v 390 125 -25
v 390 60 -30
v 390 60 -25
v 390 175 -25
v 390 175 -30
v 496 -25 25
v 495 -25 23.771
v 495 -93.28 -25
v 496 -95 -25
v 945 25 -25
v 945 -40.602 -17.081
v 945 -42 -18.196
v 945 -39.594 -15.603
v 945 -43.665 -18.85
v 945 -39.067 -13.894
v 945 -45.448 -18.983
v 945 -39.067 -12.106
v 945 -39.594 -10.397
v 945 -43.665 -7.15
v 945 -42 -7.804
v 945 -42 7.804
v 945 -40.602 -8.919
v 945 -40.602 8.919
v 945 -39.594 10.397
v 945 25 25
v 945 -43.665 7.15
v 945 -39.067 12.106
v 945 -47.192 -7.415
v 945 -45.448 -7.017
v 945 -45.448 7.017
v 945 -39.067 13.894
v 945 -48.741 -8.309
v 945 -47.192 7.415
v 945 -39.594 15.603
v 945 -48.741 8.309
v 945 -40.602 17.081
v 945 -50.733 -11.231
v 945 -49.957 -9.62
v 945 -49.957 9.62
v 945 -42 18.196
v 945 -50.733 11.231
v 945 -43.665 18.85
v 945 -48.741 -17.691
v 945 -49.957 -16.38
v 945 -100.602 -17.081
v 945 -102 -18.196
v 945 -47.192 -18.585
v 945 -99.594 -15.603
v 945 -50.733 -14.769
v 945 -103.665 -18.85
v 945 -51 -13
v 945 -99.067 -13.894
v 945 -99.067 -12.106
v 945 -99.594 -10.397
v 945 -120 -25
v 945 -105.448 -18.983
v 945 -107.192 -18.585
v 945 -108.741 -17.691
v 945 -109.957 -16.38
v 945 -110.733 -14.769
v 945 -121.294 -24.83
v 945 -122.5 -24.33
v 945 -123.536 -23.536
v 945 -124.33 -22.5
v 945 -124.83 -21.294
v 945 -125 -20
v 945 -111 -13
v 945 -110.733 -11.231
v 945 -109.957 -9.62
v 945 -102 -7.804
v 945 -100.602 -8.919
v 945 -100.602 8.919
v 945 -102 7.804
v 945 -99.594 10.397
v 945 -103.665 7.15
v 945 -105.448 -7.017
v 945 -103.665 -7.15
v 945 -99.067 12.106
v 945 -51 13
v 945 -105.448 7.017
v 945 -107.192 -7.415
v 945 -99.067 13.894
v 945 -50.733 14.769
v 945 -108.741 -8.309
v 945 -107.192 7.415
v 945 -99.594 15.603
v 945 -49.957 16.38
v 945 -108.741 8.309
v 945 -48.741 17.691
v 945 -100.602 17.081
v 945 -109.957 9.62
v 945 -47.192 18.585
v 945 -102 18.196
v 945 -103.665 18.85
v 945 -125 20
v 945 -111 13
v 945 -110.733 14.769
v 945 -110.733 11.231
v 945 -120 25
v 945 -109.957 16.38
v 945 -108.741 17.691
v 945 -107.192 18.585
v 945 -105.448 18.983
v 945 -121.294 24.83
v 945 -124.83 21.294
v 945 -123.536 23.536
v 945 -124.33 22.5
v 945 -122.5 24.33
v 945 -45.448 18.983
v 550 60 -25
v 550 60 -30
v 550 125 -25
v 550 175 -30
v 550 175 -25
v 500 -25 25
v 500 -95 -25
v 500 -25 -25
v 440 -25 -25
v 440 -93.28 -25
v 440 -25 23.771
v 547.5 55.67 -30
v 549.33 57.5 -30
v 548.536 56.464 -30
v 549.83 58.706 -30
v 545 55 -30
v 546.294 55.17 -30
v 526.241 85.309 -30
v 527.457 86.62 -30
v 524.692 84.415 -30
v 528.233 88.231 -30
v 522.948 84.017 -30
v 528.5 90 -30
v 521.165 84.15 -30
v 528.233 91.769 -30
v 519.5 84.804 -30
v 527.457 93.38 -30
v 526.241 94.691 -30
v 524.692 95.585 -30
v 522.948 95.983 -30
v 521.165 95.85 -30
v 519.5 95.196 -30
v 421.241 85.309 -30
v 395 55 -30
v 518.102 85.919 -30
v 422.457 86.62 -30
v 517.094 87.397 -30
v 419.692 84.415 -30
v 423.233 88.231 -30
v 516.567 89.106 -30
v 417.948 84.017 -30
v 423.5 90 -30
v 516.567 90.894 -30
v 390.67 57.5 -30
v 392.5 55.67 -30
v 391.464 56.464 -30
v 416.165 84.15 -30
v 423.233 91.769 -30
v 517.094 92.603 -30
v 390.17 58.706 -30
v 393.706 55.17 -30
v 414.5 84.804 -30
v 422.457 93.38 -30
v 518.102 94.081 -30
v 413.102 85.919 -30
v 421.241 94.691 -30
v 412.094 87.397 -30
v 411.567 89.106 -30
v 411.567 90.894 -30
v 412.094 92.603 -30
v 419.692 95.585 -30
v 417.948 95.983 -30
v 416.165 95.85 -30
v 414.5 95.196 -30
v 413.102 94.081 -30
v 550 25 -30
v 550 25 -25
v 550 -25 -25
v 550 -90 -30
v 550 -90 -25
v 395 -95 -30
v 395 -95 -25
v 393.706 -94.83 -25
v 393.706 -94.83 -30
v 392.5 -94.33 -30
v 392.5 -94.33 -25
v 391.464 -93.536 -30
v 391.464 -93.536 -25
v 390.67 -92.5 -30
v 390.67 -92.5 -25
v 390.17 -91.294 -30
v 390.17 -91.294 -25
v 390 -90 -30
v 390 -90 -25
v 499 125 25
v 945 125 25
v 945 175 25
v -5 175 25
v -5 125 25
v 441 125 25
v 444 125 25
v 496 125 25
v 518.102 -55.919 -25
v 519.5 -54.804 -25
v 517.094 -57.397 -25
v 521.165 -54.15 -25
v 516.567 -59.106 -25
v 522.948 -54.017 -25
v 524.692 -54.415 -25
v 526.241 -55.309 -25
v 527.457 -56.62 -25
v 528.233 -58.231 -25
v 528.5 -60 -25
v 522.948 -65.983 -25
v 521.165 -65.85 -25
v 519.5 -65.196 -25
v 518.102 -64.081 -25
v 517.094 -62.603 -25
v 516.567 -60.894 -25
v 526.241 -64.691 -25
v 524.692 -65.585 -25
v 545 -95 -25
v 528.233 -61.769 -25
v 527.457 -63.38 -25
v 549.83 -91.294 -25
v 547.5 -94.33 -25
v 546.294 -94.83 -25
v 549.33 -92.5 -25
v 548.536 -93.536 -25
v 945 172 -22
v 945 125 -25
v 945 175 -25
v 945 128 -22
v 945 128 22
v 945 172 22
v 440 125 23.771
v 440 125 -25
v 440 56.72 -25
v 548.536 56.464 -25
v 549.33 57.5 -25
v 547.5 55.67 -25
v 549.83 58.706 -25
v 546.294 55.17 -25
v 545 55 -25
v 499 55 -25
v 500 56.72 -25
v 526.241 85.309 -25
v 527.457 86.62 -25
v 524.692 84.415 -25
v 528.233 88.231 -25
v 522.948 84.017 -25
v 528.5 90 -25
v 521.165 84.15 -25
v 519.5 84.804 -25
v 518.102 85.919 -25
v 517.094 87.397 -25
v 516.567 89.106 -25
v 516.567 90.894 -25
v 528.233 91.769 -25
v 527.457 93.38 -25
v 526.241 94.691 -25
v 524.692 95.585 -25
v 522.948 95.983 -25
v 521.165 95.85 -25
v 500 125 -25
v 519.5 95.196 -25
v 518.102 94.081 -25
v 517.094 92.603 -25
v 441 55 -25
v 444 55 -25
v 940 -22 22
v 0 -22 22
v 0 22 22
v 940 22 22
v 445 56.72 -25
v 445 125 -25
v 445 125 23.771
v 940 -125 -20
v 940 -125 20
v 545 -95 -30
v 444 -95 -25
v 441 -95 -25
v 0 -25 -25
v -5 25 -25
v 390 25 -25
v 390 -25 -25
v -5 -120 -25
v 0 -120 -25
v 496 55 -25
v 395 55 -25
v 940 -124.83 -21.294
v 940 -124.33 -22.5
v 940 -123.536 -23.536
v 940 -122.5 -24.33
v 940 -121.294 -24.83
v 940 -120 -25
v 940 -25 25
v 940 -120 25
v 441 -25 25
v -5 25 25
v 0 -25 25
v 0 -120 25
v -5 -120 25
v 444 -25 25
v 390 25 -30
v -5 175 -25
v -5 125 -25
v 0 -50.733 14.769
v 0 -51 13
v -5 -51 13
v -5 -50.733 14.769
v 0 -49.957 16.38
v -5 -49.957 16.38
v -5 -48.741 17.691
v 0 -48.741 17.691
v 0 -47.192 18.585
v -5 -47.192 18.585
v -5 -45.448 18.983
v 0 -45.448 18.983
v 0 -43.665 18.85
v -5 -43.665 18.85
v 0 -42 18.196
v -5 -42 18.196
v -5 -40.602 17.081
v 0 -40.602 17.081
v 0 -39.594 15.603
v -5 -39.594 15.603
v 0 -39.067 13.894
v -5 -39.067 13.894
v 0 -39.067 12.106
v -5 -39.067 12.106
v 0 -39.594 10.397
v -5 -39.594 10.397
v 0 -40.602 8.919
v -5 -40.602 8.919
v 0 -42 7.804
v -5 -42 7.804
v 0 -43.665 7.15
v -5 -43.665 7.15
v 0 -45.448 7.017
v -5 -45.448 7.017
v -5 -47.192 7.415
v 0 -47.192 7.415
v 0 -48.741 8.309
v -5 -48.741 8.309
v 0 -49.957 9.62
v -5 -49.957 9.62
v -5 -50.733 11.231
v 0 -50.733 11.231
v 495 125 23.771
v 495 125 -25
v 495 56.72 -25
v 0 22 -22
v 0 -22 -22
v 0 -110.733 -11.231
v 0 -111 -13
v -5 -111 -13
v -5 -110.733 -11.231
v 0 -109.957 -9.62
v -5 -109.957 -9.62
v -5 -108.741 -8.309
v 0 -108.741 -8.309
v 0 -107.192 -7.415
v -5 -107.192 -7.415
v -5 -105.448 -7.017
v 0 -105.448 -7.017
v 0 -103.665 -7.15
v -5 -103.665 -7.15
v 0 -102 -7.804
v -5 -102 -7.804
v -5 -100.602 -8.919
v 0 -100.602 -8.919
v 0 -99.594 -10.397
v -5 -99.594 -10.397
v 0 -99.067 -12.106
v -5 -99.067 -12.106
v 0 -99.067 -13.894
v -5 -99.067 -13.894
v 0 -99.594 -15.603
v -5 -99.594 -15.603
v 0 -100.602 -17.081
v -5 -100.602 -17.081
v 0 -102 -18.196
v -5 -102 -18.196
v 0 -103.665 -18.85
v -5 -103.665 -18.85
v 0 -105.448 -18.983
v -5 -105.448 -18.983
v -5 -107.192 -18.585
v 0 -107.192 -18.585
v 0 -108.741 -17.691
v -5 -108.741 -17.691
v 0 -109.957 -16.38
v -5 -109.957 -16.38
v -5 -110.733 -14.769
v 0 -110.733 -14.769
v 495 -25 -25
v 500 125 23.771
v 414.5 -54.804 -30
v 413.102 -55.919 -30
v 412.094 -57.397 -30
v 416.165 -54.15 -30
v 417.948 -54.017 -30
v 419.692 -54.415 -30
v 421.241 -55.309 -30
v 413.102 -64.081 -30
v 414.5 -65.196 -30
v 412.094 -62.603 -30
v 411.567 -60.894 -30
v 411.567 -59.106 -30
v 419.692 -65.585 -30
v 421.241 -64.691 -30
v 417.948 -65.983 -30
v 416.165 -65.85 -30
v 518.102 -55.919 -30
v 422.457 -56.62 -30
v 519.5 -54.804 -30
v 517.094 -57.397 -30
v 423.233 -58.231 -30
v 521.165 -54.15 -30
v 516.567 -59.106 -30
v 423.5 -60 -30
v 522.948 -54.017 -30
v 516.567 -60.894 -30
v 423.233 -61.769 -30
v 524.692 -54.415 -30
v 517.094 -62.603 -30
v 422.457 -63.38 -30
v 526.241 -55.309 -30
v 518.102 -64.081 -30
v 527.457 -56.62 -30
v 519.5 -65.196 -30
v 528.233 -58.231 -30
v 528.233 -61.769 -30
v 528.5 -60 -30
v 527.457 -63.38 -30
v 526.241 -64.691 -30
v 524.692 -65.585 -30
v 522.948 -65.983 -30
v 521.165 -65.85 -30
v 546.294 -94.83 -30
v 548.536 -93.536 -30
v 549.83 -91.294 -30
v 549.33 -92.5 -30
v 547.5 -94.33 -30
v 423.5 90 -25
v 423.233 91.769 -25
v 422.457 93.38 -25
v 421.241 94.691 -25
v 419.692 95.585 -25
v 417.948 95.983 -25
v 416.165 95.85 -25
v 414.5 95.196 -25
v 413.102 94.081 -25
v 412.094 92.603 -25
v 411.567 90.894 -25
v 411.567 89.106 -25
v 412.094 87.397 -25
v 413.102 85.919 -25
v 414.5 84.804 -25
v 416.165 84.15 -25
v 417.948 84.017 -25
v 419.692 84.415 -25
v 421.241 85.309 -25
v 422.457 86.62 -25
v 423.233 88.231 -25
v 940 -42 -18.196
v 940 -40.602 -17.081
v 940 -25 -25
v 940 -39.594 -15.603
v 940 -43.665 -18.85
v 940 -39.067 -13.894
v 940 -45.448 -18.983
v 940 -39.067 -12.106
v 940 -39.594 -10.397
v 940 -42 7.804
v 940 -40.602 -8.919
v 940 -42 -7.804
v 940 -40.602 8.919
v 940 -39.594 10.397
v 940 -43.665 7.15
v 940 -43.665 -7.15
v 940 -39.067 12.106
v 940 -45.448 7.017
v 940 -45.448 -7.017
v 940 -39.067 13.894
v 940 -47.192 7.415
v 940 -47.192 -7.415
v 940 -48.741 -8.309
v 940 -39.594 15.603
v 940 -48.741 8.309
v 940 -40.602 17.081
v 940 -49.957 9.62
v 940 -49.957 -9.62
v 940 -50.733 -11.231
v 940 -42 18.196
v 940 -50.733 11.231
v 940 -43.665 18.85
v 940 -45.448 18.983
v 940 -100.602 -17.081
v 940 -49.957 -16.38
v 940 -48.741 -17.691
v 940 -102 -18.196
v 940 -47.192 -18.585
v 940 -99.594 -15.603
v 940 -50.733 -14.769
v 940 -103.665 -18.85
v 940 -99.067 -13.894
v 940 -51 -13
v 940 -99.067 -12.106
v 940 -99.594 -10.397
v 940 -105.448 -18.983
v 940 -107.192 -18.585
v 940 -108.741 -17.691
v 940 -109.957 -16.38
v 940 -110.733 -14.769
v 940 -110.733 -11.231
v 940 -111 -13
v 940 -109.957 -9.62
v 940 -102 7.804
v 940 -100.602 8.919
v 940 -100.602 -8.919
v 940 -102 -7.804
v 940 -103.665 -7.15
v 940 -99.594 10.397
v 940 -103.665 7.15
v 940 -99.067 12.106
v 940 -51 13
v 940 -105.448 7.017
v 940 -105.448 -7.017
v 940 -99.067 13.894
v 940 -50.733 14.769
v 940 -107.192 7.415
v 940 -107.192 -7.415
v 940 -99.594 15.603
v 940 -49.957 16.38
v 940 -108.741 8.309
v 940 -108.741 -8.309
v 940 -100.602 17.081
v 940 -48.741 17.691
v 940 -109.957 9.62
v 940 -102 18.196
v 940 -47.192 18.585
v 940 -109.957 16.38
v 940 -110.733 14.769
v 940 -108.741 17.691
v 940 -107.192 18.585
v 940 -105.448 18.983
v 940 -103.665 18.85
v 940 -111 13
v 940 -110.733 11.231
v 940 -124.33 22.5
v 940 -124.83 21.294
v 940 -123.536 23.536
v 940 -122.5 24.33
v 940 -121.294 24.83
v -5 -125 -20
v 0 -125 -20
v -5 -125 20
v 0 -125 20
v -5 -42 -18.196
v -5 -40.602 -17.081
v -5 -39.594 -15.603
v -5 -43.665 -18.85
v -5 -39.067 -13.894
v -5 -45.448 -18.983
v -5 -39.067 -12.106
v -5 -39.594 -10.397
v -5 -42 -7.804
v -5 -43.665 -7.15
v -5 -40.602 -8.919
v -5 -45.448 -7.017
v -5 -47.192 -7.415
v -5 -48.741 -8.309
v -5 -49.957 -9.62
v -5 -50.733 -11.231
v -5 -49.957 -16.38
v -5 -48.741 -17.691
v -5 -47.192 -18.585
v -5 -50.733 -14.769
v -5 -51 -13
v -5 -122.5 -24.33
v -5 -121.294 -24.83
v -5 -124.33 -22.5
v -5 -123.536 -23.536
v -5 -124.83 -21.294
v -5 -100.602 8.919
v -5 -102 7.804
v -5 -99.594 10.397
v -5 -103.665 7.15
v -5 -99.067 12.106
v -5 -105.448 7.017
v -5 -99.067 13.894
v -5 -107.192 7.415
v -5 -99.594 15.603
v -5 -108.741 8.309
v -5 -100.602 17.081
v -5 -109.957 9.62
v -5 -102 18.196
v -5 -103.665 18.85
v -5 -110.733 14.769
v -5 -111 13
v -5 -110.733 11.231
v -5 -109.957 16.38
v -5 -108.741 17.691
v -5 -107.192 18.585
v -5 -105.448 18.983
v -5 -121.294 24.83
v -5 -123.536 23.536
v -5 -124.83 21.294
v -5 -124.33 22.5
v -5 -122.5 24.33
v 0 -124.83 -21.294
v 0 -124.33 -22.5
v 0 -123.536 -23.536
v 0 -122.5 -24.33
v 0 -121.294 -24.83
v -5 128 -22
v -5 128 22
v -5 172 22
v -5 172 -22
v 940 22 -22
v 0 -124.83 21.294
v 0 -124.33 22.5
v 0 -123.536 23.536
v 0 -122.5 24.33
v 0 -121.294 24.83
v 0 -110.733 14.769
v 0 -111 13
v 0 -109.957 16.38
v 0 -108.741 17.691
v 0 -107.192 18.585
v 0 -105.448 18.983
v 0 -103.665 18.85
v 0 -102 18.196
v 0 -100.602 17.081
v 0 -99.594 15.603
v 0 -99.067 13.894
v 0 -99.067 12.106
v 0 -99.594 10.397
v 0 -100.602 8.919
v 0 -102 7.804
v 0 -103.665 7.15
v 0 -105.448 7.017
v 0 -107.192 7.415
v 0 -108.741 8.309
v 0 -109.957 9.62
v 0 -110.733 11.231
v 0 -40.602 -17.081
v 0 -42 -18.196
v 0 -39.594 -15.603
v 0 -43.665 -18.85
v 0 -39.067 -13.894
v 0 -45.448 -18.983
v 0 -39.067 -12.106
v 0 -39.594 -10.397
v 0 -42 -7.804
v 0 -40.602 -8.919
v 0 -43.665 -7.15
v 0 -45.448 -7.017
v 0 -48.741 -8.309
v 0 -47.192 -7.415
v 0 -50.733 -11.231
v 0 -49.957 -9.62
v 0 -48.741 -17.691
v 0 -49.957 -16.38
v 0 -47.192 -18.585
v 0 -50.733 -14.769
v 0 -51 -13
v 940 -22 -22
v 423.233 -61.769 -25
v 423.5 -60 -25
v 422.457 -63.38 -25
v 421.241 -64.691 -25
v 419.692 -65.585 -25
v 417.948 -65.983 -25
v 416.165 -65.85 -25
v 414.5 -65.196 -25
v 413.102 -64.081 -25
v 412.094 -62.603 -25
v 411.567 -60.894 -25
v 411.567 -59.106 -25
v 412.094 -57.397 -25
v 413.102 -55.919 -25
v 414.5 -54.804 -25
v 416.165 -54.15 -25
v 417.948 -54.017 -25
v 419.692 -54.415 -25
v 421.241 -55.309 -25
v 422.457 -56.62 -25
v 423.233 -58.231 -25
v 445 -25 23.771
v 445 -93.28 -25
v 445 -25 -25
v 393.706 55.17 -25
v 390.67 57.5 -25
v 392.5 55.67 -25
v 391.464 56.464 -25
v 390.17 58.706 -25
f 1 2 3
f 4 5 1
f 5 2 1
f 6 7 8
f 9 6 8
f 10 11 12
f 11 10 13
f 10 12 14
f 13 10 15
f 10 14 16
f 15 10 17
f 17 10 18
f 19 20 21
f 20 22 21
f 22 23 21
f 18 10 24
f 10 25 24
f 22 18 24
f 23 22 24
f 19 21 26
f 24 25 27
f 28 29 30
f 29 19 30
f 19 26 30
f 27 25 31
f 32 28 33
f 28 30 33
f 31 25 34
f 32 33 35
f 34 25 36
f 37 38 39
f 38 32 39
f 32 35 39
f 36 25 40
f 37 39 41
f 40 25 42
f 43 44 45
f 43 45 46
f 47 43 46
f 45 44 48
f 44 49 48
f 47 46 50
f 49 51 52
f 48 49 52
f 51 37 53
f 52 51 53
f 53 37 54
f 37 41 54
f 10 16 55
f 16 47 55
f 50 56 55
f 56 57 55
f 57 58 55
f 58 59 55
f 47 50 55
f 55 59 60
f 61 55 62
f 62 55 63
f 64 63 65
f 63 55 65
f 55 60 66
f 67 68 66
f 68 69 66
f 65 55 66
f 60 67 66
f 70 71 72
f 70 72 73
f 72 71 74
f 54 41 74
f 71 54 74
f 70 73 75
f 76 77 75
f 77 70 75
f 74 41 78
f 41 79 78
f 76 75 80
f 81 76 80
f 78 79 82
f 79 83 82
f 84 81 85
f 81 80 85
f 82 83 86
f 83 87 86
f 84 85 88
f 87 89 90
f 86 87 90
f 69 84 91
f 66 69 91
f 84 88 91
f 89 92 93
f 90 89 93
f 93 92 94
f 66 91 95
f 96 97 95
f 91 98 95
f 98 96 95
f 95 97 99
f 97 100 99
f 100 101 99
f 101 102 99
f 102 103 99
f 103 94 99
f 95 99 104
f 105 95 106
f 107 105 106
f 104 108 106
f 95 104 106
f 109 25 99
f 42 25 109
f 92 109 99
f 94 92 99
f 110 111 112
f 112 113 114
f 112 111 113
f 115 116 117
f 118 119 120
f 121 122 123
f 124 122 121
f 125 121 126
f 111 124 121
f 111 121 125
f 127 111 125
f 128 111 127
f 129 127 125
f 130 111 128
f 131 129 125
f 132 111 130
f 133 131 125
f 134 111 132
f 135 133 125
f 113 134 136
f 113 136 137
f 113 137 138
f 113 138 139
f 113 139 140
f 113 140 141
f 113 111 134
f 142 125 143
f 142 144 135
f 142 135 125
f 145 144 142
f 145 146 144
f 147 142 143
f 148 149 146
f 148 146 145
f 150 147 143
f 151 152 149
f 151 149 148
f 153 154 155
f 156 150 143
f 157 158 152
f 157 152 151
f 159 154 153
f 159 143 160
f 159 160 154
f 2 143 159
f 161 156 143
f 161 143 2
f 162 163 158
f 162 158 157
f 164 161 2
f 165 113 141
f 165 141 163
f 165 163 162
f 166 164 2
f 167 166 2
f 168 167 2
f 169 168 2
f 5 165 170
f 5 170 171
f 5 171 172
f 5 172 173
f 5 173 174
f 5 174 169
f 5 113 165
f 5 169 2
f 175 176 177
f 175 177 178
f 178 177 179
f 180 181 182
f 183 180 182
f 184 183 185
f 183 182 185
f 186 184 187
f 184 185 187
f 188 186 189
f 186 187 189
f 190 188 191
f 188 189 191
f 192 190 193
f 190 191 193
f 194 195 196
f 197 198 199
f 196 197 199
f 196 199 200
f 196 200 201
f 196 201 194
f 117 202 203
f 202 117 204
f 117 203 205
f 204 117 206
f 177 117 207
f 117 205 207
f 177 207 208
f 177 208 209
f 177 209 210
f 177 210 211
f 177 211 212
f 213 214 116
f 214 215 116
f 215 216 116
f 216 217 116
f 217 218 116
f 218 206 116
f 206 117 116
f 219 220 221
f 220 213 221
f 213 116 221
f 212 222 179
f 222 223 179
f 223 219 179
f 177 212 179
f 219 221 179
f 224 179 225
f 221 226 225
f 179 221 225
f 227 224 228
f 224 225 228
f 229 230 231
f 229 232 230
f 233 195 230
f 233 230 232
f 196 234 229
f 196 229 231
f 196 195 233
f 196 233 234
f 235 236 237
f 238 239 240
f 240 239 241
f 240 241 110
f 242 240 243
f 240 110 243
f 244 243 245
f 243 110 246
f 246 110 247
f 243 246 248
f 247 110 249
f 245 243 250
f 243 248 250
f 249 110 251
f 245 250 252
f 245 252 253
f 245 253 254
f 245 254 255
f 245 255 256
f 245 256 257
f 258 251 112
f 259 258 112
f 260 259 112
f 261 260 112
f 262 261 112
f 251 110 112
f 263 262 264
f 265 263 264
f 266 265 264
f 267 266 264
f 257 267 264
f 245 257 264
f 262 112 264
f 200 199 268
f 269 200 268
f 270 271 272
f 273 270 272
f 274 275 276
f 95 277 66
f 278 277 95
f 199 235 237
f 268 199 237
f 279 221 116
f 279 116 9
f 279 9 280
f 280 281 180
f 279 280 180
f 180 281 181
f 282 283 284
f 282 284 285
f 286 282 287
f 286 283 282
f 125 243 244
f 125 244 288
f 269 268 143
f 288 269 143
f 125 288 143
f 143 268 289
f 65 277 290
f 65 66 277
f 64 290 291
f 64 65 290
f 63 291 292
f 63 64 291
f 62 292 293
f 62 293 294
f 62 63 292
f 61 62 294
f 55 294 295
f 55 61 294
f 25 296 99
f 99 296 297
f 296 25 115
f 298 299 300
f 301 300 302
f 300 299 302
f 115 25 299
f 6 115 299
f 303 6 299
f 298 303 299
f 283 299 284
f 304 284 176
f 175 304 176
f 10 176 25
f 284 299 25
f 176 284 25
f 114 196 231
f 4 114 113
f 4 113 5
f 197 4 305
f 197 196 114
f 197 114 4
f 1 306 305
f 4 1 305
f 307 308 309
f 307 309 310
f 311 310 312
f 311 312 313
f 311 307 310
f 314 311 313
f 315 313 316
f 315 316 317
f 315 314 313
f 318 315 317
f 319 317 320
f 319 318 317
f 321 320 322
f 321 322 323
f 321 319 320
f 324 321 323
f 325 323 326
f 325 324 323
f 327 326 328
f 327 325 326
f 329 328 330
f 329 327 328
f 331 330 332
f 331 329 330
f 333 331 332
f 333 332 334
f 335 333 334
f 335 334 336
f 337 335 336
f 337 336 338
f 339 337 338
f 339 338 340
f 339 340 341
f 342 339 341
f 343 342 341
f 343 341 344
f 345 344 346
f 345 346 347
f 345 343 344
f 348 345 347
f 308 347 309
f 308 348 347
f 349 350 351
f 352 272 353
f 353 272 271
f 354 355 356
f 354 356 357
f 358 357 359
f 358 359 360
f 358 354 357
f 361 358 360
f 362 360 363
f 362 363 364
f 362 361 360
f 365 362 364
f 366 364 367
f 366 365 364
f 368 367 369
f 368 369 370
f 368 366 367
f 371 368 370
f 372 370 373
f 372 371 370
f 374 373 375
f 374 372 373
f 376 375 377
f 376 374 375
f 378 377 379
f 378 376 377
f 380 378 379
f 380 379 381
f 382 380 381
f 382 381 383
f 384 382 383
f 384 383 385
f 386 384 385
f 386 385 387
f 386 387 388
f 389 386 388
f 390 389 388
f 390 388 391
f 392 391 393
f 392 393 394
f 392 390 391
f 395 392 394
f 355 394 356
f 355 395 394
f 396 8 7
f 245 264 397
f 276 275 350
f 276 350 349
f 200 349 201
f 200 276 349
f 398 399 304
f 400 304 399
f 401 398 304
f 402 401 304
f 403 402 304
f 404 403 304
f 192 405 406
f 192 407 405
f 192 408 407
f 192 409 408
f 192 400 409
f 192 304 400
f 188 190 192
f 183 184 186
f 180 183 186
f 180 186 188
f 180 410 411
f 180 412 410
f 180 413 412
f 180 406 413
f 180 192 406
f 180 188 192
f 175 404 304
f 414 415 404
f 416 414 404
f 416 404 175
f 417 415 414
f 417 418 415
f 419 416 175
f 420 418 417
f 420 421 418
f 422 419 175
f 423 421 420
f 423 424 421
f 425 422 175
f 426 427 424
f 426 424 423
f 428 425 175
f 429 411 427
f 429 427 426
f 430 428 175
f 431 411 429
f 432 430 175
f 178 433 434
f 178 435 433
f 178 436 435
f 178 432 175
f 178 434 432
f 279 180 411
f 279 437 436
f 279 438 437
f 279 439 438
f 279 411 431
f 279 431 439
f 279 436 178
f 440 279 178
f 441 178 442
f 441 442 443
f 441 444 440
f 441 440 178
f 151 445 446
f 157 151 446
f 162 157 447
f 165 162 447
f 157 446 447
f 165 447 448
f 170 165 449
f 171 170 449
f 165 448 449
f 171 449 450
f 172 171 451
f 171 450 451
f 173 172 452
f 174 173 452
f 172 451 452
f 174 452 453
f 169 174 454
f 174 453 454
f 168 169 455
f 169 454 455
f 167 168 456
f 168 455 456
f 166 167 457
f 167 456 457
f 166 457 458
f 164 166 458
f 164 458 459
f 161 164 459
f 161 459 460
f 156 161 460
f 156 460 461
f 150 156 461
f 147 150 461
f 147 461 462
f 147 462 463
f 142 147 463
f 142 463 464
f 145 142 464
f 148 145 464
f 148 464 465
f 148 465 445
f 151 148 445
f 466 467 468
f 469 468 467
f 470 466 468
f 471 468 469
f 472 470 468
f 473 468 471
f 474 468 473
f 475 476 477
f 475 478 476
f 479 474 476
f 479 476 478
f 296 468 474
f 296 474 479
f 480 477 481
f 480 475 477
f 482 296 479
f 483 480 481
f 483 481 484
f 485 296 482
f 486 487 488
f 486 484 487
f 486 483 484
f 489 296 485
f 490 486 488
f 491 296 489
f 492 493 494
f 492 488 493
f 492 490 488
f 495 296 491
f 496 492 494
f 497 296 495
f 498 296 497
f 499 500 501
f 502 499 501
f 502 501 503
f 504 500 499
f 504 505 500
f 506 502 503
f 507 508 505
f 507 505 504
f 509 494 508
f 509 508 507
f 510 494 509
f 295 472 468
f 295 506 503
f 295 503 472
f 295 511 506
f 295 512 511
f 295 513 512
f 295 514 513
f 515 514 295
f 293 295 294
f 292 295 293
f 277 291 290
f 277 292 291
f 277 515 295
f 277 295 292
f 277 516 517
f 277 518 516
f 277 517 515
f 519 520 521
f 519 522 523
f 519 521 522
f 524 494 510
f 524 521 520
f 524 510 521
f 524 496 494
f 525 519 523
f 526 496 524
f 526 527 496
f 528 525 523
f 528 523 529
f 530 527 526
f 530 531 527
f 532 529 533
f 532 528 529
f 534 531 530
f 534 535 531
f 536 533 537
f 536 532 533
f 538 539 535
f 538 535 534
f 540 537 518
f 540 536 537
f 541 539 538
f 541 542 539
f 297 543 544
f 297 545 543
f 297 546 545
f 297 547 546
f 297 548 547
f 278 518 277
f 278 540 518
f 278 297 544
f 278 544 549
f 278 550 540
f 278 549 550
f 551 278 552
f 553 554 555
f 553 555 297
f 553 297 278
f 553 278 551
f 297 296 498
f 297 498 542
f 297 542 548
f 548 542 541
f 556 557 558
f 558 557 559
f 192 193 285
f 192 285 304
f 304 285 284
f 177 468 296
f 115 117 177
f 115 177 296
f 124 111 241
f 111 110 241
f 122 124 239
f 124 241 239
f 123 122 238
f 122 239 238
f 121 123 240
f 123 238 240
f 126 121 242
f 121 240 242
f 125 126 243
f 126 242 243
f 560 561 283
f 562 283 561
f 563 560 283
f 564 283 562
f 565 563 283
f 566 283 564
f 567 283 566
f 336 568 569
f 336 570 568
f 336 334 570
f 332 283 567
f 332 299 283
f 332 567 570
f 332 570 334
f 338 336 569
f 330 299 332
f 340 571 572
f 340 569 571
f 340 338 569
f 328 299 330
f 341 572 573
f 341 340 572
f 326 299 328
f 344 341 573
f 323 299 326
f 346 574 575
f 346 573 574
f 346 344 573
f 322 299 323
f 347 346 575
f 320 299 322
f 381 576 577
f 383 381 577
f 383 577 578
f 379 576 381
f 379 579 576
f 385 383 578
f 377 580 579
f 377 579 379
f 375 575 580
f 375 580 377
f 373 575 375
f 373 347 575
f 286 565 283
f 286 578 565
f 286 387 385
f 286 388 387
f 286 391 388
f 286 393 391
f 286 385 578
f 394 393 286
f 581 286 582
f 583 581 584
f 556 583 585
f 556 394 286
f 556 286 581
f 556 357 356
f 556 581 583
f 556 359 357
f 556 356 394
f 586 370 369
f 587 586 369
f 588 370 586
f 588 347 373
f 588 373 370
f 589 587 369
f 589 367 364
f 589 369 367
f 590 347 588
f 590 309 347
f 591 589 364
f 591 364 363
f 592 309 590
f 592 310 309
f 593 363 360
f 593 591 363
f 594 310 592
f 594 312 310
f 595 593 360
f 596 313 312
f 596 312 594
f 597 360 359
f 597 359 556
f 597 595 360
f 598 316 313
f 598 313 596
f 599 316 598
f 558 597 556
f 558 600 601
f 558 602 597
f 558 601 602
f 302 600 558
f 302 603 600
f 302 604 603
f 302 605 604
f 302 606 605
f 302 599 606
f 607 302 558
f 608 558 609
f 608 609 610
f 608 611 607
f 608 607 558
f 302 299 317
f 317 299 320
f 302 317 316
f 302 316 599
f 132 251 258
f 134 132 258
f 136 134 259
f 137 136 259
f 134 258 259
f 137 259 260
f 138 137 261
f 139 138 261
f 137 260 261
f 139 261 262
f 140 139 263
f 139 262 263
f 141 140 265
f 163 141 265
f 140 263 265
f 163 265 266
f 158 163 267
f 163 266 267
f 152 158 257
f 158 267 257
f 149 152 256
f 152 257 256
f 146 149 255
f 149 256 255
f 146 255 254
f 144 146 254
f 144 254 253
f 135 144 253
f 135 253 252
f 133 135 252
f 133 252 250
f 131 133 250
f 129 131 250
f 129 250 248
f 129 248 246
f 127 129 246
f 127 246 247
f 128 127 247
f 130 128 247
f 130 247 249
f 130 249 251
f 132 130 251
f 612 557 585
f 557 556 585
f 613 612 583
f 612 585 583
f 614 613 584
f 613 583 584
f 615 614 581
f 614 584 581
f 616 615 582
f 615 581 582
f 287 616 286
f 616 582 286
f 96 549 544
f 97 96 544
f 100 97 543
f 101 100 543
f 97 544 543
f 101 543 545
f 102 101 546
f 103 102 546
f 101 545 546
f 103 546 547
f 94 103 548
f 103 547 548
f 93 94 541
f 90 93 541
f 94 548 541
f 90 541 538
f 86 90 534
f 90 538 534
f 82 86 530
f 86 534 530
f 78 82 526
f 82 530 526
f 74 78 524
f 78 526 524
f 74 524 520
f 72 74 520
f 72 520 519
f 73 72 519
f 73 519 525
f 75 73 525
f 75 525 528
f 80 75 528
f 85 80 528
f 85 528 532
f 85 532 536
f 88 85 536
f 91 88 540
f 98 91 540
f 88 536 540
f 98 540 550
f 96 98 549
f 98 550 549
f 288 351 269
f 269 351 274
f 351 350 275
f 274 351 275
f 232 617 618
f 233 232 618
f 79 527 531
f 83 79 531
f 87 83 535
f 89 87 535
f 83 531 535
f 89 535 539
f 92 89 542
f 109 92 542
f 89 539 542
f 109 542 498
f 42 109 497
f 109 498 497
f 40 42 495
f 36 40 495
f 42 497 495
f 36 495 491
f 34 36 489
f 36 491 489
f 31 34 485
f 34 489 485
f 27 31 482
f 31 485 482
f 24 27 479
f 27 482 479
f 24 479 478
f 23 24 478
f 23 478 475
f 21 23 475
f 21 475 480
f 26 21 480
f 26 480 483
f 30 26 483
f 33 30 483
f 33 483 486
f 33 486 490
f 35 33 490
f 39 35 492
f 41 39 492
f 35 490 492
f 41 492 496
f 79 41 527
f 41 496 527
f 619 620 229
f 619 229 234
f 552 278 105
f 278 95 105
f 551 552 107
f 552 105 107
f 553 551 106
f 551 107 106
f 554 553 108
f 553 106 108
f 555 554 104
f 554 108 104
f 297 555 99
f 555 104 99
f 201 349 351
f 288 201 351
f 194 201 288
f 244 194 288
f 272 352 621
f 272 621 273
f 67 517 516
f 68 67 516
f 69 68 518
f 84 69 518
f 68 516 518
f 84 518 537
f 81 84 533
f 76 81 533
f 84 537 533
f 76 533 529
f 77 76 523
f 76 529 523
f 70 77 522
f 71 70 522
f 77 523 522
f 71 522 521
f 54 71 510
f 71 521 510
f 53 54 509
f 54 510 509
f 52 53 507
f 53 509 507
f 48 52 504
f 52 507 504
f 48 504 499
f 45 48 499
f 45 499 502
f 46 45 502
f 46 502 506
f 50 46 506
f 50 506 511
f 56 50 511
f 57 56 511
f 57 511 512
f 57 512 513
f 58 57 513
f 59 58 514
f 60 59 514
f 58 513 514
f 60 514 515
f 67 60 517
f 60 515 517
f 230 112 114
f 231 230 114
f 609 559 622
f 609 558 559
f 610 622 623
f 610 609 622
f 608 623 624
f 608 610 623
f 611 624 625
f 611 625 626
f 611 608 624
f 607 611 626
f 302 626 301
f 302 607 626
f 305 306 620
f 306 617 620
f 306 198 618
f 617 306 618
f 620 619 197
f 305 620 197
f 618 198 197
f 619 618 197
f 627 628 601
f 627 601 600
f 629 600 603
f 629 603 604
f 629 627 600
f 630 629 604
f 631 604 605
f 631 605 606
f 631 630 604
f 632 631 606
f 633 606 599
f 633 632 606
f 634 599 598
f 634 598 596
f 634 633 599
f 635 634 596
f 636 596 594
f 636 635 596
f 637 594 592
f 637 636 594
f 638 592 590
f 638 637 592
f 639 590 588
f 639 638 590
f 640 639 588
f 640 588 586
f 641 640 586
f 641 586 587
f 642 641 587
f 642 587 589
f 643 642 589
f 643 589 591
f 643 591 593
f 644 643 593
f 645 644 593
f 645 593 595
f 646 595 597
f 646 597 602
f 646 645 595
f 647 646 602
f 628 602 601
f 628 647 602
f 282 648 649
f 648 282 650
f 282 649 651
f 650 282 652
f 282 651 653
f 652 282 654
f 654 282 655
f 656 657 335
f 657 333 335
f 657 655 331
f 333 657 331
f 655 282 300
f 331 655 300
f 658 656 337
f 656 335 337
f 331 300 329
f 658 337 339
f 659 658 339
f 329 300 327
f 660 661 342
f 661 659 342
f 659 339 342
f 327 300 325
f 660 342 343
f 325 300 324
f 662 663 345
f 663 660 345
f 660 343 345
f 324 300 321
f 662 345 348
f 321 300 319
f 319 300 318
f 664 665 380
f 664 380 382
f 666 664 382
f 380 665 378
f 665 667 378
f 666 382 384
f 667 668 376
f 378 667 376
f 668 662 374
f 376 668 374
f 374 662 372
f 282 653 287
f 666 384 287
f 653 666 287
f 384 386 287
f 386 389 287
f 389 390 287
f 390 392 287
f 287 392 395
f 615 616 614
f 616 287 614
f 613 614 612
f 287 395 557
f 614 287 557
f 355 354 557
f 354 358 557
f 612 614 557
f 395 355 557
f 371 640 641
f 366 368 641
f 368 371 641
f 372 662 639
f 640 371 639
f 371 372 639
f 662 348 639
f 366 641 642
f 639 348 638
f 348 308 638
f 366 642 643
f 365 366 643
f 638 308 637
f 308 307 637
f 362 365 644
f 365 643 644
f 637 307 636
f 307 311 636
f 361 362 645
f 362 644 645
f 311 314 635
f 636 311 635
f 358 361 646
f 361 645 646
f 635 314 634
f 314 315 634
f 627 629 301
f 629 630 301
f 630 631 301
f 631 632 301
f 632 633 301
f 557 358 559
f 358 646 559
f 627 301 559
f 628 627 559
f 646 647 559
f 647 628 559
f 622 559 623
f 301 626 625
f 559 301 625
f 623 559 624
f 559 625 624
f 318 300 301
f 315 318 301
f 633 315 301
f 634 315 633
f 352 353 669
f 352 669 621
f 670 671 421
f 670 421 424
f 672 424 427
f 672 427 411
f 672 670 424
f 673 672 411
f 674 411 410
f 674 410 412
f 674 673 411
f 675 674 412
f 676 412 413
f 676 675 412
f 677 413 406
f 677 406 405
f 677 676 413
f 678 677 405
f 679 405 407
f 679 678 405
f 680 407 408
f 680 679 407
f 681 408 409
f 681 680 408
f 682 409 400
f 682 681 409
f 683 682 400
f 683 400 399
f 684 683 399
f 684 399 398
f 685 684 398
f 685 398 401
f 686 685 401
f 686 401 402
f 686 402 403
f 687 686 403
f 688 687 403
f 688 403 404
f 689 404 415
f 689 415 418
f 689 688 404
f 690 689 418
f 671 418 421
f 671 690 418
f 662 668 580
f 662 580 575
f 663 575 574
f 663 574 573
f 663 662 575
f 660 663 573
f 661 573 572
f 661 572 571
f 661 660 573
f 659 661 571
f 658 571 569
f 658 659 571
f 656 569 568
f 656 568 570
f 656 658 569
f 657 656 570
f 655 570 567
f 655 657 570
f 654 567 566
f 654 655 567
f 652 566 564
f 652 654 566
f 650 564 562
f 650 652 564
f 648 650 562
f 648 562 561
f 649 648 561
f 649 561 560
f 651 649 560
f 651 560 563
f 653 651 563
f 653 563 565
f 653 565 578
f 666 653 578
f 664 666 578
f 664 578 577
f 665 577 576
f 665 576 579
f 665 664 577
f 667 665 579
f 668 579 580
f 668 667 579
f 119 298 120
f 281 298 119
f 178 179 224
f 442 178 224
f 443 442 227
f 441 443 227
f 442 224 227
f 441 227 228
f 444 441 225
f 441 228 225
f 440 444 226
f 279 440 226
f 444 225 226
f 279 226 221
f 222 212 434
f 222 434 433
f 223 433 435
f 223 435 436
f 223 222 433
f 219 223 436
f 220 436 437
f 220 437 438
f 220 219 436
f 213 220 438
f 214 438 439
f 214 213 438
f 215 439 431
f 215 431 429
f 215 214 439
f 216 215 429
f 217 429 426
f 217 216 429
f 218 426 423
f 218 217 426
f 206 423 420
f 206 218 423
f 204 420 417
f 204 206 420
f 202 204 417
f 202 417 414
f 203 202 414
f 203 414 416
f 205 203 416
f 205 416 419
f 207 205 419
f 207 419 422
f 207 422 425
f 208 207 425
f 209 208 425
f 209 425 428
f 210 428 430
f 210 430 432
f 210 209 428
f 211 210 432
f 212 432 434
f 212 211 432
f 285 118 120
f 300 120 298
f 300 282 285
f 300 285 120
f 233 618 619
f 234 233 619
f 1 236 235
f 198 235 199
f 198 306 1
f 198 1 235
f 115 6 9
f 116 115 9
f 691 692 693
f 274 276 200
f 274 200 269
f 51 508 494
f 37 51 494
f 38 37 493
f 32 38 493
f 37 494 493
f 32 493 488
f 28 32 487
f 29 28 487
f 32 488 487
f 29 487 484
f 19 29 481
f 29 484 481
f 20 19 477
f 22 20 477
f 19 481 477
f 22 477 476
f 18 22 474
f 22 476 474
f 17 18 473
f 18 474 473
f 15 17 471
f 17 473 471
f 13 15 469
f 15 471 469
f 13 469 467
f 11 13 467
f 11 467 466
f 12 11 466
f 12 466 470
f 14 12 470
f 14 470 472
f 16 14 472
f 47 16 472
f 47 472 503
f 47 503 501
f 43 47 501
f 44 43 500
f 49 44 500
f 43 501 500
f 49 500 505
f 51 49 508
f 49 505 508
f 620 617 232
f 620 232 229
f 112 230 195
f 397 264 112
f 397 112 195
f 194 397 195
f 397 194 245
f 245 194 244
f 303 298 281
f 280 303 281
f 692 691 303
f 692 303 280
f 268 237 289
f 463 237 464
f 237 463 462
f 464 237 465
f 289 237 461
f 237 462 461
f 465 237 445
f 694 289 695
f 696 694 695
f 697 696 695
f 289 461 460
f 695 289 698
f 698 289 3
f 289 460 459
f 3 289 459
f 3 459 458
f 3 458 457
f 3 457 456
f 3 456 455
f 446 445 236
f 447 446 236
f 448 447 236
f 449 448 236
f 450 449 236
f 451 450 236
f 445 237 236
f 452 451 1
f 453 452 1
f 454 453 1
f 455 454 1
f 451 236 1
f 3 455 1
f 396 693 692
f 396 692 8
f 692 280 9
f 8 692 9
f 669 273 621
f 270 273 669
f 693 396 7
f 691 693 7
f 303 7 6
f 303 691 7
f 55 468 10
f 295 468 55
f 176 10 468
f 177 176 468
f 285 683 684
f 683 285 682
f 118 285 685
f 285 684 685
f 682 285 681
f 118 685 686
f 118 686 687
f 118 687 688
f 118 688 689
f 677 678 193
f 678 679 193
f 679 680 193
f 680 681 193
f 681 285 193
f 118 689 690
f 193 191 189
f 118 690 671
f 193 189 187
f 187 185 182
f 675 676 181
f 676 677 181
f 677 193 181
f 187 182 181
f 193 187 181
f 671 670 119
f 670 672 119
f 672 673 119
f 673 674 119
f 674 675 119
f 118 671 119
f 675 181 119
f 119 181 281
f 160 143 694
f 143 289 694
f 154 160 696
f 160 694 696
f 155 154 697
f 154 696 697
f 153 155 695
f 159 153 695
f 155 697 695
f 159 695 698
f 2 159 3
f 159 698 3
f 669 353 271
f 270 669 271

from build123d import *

# Parameters (mm, degrees)
F0_W      = 50
F0_H      = 50
F0_W_2    = 44
F0_H_2    = 44
F1_DEPTH  = 940
F2_W      = 150
F2_H      = 50
F2_R      = 6
F3_DEPTH  = 5
F6_R      = 5
F7_R      = 6
F8_DEPTH  = 5
F9_W      = 5
F9_H      = 70
F10_DEPTH = 50
F12_DEPTH = 110
F13_SIZE  = 1
F15_W     = 50
F15_H     = 50
F15_W_2   = 44
F15_H_2   = 44
F16_DEPTH = 950
F17_W     = 160
F17_H     = 5
F18_DEPTH = 120
F19_R     = 6
F20_DEPTH = 25
F21_W     = 5
F21_H     = 50
F22_DEPTH = 70
F24_DEPTH = 60
F25_R     = 5
F26_SIZE  = 1


with BuildPart() as f1:
    # F0 (on Right) → F1 (new body)
    with BuildSketch(Plane.YZ):
        Rectangle(F0_W, F0_H)
        Rectangle(F0_W_2, F0_H_2, mode=Mode.SUBTRACT)
    extrude(amount=F1_DEPTH)

    # F2 (on face) → F3 (join)
    with BuildSketch(Plane(origin=(0, 0, 0), x_dir=(0, -1, 0), z_dir=(-1, 0, 0))):
        with Locations((50, 0)):
            Rectangle(F2_W, F2_H)
        with Locations((45, -13)):
            Circle(F2_R, mode=Mode.SUBTRACT)
        with Locations((105, -13)):
            Circle(F2_R, mode=Mode.SUBTRACT)
        with Locations((45, 13)):
            Circle(F2_R, mode=Mode.SUBTRACT)
        with Locations((105, 13)):
            Circle(F2_R, mode=Mode.SUBTRACT)
    extrude(amount=F3_DEPTH)

    # F5: F1 across plane


with BuildPart() as f1_1:
    add(f1.part)
    add(f1.part.mirror(Plane.YZ.offset(470)))

    # F6
    f6_edges = [f1_1.edges().sort_by_distance(p)[0] for p in [
        (-2.5, -125, 25),
        (-2.5, -125, -25),
        (942.5, -125, 25),
        (942.5, -125, -25),
    ]]
    fillet(f6_edges, radius=F6_R)

    # F7 (on face) → F8 (join)
    with BuildSketch(Plane(origin=(0, 0, -25), x_dir=(1, 0, 0), z_dir=(0, 0, -1))):
        with BuildLine():
            Line((390, 90), (390, -25))
            Line((390, -25), (550, -25))
            Line((550, -25), (550, 90))
            ThreePointArc((550, 90), (548.5355339059, 93.5355339059), (545, 95))
            Line((545, 95), (395, 95))
            ThreePointArc((395, 95), (391.4644660941, 93.5355339059), (390, 90))
        make_face()
        with Locations((417.5, 60)):
            Circle(F7_R, mode=Mode.SUBTRACT)
        with Locations((522.5, 60)):
            Circle(F7_R, mode=Mode.SUBTRACT)
    extrude(amount=F8_DEPTH)

    # F9 (on face) → F10 (join)
    with BuildSketch(Plane.XY.offset(-25)):
        with Locations((442.5, -60)):
            Rectangle(F9_W, F9_H)
        with Locations((497.5, -60)):
            Rectangle(F9_W, F9_H)
    extrude(amount=F10_DEPTH)

    # F11 (on face) → F12 (cut)
    with BuildSketch(Plane(origin=(440, 0, 0), x_dir=(0, -1, 0), z_dir=(-1, 0, 0))):
        Polygon((95, -25), (95, 25), (25, 25), align=None)
    extrude(amount=-F12_DEPTH, mode=Mode.SUBTRACT)

    # F13
    f13_edges = [f1_1.edges().sort_by_distance(p)[0] for p in [
        (440, -60, 0),
        (445, -60, 0),
        (495, -60, 0),
    ]]
    chamfer(f13_edges, length=F13_SIZE)


with BuildPart() as f16:
    # F15 (on offset) → F16 (new body)
    with BuildSketch(Plane.YZ.offset(-5)):
        with Locations((150, 0)):
            Rectangle(F15_W, F15_H)
        with Locations((150, 0)):
            Rectangle(F15_W_2, F15_H_2, mode=Mode.SUBTRACT)
    extrude(amount=F16_DEPTH)

    # F17 (on face) → F18 (join)
    with BuildSketch(Plane(origin=(0, 175, 0), x_dir=(-1, 0, 0), z_dir=(0, 1, 0))):
        with Locations((-470, -27.5)):
            Rectangle(F17_W, F17_H)
    extrude(amount=-F18_DEPTH)

    # F19 (on face) → F20 (cut)
    with BuildSketch(Plane.XY.offset(-25)):
        with Locations((417.5, 90)):
            Circle(F19_R)
        with Locations((522.5, 90)):
            Circle(F19_R)
    extrude(amount=-F20_DEPTH, mode=Mode.SUBTRACT)

    # F21 (on face) → F22 (join)
    with BuildSketch(Plane.XZ.offset(-125)):
        with Locations((442.5, 0)):
            Rectangle(F21_W, F21_H)
        with Locations((497.5, 0)):
            Rectangle(F21_W, F21_H)
    extrude(amount=F22_DEPTH)

    # F23 (on face) → F24 (cut)
    with BuildSketch(Plane(origin=(440, 0, 0), x_dir=(0, -1, 0), z_dir=(-1, 0, 0))):
        Polygon((-55, -25), (-55, 25), (-125, 25), align=None)
    extrude(amount=-F24_DEPTH, mode=Mode.SUBTRACT)

    # F25
    f25_edges = [f16.edges().sort_by_distance(p)[0] for p in [
        (390, 55, -27.5),
        (550, 55, -27.5),
    ]]
    fillet(f25_edges, radius=F25_R)

    # F26
    f26_edges = [f16.edges().sort_by_distance(p)[0] for p in [
        (445, 90, 0),
        (440, 90, 0),
        (500, 90, 0),
        (495, 90, 0),
    ]]
    chamfer(f26_edges, length=F26_SIZE)


solid = Compound([f1_1.part, f16.part])
